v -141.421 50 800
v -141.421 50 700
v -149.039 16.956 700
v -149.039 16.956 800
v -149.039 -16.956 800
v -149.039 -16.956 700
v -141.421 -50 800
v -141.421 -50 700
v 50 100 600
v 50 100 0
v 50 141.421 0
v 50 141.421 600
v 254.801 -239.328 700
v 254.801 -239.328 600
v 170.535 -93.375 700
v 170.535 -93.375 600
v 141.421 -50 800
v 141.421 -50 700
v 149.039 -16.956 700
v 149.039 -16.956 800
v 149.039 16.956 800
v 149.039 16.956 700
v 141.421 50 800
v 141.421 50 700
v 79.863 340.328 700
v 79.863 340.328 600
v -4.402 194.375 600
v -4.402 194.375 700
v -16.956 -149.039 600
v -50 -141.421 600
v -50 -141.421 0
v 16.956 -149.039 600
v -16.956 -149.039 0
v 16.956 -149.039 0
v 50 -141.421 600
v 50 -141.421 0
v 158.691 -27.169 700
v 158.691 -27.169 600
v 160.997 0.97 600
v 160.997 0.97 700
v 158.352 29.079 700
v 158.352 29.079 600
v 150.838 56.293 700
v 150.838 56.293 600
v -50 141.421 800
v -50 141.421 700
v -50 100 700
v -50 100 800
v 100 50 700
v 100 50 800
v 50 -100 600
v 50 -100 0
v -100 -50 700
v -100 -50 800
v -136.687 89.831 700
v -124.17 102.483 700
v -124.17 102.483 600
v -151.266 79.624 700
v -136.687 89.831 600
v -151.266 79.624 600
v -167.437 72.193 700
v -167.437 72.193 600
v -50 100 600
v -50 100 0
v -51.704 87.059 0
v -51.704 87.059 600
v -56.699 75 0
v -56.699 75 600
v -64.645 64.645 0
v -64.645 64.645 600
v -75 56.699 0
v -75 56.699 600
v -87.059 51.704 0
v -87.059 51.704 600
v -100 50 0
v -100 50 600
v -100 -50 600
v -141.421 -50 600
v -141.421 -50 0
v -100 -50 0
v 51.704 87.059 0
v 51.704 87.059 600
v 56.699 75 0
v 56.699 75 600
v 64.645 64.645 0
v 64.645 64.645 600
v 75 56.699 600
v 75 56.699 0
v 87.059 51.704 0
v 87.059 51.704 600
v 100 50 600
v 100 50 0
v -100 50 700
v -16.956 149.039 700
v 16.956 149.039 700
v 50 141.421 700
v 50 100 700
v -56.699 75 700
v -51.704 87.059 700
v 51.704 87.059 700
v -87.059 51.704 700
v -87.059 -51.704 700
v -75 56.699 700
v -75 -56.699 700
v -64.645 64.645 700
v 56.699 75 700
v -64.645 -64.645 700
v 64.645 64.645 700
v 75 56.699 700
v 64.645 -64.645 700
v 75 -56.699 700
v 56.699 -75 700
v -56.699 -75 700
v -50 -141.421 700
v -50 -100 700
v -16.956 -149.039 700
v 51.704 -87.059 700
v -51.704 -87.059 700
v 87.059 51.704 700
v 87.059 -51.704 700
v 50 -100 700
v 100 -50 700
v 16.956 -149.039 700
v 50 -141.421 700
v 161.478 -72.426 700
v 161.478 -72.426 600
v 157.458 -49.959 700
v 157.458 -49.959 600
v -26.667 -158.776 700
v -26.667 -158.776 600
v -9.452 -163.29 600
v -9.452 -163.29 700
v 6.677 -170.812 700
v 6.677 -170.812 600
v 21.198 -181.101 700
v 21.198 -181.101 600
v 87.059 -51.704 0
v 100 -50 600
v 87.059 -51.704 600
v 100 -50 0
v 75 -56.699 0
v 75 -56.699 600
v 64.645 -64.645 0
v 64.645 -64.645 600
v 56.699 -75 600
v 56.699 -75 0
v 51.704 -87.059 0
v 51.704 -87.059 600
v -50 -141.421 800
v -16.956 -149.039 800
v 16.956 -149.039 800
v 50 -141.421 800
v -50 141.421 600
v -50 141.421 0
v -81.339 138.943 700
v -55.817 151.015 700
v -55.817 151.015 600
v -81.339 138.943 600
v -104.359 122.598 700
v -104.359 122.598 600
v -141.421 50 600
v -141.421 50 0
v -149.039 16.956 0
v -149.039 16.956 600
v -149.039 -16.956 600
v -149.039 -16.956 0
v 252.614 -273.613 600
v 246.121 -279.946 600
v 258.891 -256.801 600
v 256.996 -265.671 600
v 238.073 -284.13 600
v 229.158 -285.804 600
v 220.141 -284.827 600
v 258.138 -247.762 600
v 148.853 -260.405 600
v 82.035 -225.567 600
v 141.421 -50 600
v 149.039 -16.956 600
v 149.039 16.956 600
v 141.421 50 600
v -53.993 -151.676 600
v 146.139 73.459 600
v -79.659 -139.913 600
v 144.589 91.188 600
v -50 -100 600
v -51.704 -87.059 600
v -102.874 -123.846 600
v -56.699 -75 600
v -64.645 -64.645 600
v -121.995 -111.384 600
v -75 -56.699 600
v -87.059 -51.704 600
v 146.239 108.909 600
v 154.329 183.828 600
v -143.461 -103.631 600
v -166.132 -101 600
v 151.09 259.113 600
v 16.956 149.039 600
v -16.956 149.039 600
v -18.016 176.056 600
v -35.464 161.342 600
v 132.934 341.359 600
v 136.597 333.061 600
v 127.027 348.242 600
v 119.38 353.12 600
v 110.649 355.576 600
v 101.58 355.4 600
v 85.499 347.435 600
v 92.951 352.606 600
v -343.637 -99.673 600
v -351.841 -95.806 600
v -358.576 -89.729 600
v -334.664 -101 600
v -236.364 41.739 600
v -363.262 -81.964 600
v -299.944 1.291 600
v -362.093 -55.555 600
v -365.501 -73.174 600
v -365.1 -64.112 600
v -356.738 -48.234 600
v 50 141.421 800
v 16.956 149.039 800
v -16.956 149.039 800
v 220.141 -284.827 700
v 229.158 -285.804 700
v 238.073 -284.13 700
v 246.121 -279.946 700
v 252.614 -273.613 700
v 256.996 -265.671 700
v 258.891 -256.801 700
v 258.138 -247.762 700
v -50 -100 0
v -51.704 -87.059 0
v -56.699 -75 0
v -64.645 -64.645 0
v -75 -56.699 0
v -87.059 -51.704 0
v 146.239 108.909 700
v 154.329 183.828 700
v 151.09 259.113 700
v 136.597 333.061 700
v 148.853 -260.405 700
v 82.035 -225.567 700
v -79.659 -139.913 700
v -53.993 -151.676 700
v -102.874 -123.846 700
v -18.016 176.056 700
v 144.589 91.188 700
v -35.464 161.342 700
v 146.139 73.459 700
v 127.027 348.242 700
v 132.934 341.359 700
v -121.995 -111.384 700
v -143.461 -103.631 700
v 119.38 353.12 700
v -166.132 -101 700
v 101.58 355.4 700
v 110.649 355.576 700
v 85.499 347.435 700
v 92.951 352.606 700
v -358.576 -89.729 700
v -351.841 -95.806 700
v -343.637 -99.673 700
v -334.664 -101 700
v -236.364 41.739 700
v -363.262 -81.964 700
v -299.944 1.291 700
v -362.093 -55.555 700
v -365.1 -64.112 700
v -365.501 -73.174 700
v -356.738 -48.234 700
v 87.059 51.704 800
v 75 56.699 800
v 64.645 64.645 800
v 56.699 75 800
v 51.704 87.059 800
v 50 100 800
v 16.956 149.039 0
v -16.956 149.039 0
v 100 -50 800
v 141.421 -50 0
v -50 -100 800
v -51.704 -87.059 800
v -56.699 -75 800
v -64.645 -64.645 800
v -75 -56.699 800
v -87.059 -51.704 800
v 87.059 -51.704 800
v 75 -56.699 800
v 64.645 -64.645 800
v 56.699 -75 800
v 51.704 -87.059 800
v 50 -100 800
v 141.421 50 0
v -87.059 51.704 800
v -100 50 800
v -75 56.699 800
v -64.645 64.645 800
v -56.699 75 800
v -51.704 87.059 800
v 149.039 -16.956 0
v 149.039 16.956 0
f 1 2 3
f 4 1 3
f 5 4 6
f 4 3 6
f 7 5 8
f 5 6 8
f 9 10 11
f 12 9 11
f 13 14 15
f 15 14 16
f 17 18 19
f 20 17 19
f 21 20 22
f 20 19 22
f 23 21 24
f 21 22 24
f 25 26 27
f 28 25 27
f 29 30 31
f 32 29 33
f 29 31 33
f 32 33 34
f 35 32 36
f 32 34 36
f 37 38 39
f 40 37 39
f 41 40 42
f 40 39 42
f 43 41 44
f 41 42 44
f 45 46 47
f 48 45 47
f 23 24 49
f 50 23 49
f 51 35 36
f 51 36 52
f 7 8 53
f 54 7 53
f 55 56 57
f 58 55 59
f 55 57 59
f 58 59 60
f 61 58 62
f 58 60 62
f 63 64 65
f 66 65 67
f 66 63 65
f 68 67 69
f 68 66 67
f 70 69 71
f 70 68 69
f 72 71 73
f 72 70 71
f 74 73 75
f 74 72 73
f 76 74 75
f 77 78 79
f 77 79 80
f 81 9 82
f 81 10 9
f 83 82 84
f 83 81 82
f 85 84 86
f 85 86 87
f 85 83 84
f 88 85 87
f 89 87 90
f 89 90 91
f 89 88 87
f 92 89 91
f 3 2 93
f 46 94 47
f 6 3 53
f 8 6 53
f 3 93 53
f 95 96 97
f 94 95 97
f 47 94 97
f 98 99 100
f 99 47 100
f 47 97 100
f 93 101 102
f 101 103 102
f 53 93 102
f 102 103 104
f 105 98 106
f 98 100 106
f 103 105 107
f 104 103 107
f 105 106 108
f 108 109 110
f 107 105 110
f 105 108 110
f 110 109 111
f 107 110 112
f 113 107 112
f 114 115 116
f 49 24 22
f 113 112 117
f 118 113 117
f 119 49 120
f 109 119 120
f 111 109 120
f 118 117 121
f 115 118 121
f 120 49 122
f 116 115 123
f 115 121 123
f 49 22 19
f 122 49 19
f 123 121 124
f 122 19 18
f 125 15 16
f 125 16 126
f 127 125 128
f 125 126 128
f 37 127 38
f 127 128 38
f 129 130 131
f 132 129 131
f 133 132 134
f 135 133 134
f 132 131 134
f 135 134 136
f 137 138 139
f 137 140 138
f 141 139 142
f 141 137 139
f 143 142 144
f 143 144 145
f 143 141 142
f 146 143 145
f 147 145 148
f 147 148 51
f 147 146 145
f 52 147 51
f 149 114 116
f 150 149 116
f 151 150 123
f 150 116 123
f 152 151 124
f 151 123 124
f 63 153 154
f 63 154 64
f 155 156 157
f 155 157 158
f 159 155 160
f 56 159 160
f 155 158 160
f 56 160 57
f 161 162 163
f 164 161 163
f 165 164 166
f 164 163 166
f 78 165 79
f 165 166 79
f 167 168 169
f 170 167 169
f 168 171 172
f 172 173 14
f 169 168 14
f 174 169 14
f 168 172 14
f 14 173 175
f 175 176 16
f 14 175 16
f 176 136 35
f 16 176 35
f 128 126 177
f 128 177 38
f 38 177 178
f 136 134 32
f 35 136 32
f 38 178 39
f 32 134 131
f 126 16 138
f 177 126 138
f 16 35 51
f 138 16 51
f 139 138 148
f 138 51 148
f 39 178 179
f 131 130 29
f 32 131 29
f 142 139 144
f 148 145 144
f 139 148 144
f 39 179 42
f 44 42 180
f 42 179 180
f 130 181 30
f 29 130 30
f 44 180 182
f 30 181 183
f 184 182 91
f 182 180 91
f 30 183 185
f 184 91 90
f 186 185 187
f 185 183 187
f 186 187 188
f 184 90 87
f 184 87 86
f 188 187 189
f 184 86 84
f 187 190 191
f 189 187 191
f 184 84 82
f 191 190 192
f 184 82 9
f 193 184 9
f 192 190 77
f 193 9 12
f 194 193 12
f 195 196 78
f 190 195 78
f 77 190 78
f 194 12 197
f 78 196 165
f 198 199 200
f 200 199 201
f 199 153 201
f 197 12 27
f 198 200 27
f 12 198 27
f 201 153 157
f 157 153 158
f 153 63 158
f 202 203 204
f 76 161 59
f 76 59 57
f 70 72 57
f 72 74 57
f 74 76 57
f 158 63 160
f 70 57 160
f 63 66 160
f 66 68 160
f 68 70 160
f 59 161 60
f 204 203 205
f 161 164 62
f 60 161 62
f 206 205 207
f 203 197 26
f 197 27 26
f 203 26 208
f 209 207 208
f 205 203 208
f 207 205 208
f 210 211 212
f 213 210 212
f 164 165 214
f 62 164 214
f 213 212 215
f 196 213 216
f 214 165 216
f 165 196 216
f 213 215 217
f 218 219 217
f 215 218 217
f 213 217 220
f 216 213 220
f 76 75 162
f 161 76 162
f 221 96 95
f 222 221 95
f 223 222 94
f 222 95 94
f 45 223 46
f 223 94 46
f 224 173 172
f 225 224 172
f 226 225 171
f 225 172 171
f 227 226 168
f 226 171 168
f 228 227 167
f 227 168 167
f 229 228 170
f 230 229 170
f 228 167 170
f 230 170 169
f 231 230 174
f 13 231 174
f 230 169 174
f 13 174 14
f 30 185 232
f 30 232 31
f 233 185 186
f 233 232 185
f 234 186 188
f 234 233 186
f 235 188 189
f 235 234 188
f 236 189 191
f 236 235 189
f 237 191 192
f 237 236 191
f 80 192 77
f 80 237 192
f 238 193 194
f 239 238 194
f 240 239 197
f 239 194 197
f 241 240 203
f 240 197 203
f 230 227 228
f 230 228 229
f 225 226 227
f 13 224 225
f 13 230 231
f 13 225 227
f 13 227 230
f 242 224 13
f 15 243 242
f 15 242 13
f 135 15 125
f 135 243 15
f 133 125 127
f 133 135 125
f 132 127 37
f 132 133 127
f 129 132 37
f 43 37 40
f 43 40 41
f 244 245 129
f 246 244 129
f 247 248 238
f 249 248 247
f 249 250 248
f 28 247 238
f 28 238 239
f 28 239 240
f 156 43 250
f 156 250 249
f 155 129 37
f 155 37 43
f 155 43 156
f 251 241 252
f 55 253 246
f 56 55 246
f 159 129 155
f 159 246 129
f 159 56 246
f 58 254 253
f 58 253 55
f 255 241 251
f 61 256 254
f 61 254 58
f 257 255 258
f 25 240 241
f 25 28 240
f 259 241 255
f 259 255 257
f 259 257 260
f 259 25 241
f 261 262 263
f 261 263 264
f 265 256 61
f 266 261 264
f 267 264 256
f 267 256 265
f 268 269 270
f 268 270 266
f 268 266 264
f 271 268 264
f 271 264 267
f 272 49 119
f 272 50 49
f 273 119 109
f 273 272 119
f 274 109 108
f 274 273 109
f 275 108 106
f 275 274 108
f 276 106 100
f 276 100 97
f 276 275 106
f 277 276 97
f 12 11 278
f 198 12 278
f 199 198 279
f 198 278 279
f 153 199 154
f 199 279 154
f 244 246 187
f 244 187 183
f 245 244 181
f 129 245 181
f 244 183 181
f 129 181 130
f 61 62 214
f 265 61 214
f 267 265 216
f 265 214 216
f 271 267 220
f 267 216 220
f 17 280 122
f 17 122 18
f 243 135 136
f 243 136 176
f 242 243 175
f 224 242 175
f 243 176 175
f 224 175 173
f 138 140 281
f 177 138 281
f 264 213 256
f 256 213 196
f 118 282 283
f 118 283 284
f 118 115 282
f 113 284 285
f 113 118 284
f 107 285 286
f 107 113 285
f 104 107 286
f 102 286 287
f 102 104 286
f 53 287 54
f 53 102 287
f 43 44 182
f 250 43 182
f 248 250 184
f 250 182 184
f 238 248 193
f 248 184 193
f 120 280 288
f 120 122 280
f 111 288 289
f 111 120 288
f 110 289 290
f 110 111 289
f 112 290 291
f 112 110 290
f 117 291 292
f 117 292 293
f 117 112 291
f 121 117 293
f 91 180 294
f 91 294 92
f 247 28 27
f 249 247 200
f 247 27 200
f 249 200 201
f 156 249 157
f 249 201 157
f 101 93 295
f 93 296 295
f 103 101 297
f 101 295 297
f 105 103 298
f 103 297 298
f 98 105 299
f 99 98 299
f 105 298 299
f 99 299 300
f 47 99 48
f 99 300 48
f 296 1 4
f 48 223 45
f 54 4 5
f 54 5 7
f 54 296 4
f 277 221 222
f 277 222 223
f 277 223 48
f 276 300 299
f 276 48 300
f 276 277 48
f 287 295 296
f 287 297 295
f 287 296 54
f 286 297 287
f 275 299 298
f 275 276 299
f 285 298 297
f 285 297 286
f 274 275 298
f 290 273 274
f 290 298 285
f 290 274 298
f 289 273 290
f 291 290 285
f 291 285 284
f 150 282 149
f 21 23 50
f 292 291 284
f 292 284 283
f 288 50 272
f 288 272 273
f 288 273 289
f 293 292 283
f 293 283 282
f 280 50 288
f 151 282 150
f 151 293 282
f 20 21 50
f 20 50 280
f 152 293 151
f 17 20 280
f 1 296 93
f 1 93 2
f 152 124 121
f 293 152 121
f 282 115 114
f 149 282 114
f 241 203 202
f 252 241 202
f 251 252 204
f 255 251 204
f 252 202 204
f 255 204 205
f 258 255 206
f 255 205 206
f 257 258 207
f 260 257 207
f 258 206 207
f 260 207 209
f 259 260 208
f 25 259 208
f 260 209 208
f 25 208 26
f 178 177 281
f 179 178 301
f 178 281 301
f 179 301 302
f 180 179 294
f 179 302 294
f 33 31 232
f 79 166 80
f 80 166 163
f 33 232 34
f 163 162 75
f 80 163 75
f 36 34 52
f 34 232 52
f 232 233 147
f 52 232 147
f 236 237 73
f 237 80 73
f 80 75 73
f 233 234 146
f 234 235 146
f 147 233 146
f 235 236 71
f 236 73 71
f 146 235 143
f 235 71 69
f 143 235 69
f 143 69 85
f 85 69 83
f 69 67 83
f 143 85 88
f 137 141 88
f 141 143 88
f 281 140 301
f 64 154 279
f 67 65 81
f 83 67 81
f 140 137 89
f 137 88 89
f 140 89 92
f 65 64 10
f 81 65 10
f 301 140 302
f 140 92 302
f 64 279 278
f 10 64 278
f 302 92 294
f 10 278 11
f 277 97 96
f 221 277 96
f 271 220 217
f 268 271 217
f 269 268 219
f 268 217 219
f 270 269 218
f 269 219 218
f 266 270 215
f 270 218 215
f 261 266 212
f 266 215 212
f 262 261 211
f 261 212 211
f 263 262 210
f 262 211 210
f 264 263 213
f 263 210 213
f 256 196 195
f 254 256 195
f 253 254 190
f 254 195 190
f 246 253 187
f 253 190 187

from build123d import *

# Parameters (mm, degrees)
BOSS_EXTRUDE1_DEPTH = 600
CIRPATTERN1_COUNT   = 4
FILLET1_R           = 50
SKETCH4_R           = 160
BOSS_EXTRUDE3_DEPTH = 100
BOSS_EXTRUDE2_DEPTH = 100
FILLET2_R           = 30
CIRPATTERN2_COUNT   = 3
FILLET4_R           = 100
EXTRUDE_THIN1_START = -100
EXTRUDE_THIN1_DEPTH = 100
BOSS_EXTRUDE4_START = 700
BOSS_EXTRUDE4_DEPTH = 100
CIRPATTERN3_COUNT   = 4
FILLET3_R           = 50


with BuildPart() as part:
    # Sketch1 → Boss-Extrude1 (new body)
    with BuildSketch(Plane(origin=(0, 0, 0), x_dir=(0, 1, 0), z_dir=(0, 0, 1))):
        with BuildLine():
            Line((-50, 141.421356237), (-50, 0))
            Line((-50, 0), (50, 0))
            Line((50, 0), (50, 141.421356237))
            ThreePointArc((50, 141.421356237), (0, 150), (-50, 141.421356237))
        make_face()
    extrude(amount=BOSS_EXTRUDE1_DEPTH)


with BuildPart() as cirpattern1_1:
    # CirPattern1: pattern copy
    add(part.part.rotate(Axis((0, 0, 0), (0, 0, 1)), 1 * 360 / CIRPATTERN1_COUNT))


with BuildPart() as cirpattern1_2:
    # CirPattern1: pattern copy
    add(part.part.rotate(Axis((0, 0, 0), (0, 0, 1)), 2 * 360 / CIRPATTERN1_COUNT))


with BuildPart() as cirpattern1_3:
    # CirPattern1: pattern copy
    add(part.part.rotate(Axis((0, 0, 0), (0, 0, 1)), 3 * 360 / CIRPATTERN1_COUNT))


with BuildPart() as part_1:
    add(part.part)

    # Combine1: union CirPattern1_1, CirPattern1_2, CirPattern1_3
    add(cirpattern1_1.part)
    add(cirpattern1_2.part)
    add(cirpattern1_3.part)

    # Fillet1
    fillet1_edges = [part_1.edges().sort_by_distance(p)[0] for p in [
        (-50, 50, 300),
        (-50, -50, 300),
        (50, -50, 300),
        (50, 50, 300),
    ]]
    fillet(fillet1_edges, radius=FILLET1_R)

    # Sketch4 → Boss-Extrude3 (add)
    with BuildSketch(Plane(origin=(0, 0, 600), x_dir=(0, 1, 0), z_dir=(0, 0, 1))):
        Circle(SKETCH4_R)
    extrude(amount=BOSS_EXTRUDE3_DEPTH)


with BuildPart() as body_2:
    # Sketch3 → Boss-Extrude2 (new body)
    with BuildSketch(Plane(origin=(0, 0, 600), x_dir=(0, 1, 0), z_dir=(0, 0, 1))):
        with BuildLine():
            Line((-100, 0), (-100, 400))
            ThreePointArc((-100, 400), (47.2135955, 223.60679775), (100, 0))
            Line((100, 0), (-100, 0))
        make_face()
    extrude(amount=BOSS_EXTRUDE2_DEPTH)

    # Fillet2
    fillet2_edges = [body_2.edges().sort_by_distance(p)[0] for p in [
        (-400, -100, 650),
    ]]
    fillet(fillet2_edges, radius=FILLET2_R)


with BuildPart() as cirpattern2_1:
    # CirPattern2: pattern copy
    add(body_2.part.rotate(Axis((0, 0, 0), (0, 0, 1)), 1 * 360 / CIRPATTERN2_COUNT))


with BuildPart() as cirpattern2_2:
    # CirPattern2: pattern copy
    add(body_2.part.rotate(Axis((0, 0, 0), (0, 0, 1)), 2 * 360 / CIRPATTERN2_COUNT))


with BuildPart() as part_2:
    add(part_1.part)

    # Combine2: union body 2, CirPattern2_2, CirPattern2_1
    add(body_2.part)
    add(cirpattern2_2.part)
    add(cirpattern2_1.part)

    # Fillet4
    fillet4_edges = [part_2.edges().sort_by_distance(p)[0] for p in [
        (-138.274184142, 80.5, 650),
        (-124.899959968, -100, 650),
        (-24.152560394, 158.166538264, 650),
        (-0.577952934, -159.998956154, 650),
        (138.852137075, 79.498956154, 650),
        (149.052520362, -58.166538264, 650),
    ]]
    fillet(fillet4_edges, radius=FILLET4_R)

    # Sketch5 → Extrude-Thin1 (add)
    with BuildSketch(Plane(origin=(0, 0, 700), x_dir=(0, 1, 0), z_dir=(0, 0, 1)).offset(EXTRUDE_THIN1_START)):
        with BuildLine():
            Line((-101, 334.664010614), (-101, 166.132477258))
            ThreePointArc((-101, 166.132477258), (-106.886545631, 132.503849344), (-123.846153846, 102.874341687))
            ThreePointArc((-123.846153846, 102.874341687), (-146.358154113, 67.084206225), (-158.776100224, 26.667395777))
            ThreePointArc((-158.776100224, 26.667395777), (-166.687757285, 1.218391324), (-181.101188564, -21.198101351))
            ThreePointArc((-181.101188564, -21.198101351), (-244.243580866, -114.788399022), (-284.826797866, -220.140703324))
            ThreePointArc((-284.826797866, -220.140703324), (-273.61273561, -252.61379645), (-239.327534924, -254.800571089))
            Line((-239.327534924, -254.800571089), (-93.374945699, -170.534804411))
            ThreePointArc((-93.374945699, -170.534804411), (-61.308426816, -158.818388511), (-27.168716375, -158.691086235))
            ThreePointArc((-27.168716375, -158.691086235), (15.082450273, -160.291982625), (56.293407917, -150.837834197))
            ThreePointArc((56.293407917, -150.837834197), (82.288720804, -144.965027971), (108.908688564, -146.239179276))
            ThreePointArc((108.908688564, -146.239179276), (221.531460046, -154.12694623), (333.060840419, -136.596890968))
            ThreePointArc((333.060840419, -136.596890968), (355.576332877, -110.648681612), (340.327534924, -79.863439525))
            Line((340.327534924, -79.863439525), (194.374945699, 4.402327153))
            ThreePointArc((194.374945699, 4.402327153), (168.194972447, 26.314539167), (151.014870222, 55.816744548))
            ThreePointArc((151.014870222, 55.816744548), (131.275703839, 93.2077764), (102.482692308, 124.17043842))
            ThreePointArc((102.482692308, 124.17043842), (84.399036481, 143.746636647), (72.1925, 167.437280627))
            ThreePointArc((72.1925, 167.437280627), (22.71212082, 268.915345252), (-48.234042553, 356.737594292))
            ThreePointArc((-48.234042553, 356.737594292), (-81.963597267, 363.262478063), (-101, 334.664010614))
        make_face()
        with BuildLine():
            Line((-100, 334.664010614), (-100, 166.132477258))
            ThreePointArc((-100, 166.132477258), (-105.946005687, 132.164166234), (-123.076923077, 102.235370621))
            ThreePointArc((-123.076923077, 102.235370621), (-145.449097255, 66.667534136), (-157.789913267, 26.501759778))
            ThreePointArc((-157.789913267, 26.501759778), (-165.781486055, 0.795694675), (-180.340507548, -21.847227219))
            ThreePointArc((-180.340507548, -21.847227219), (-243.356867131, -115.250717909), (-283.859079706, -220.392738171))
            ThreePointArc((-283.859079706, -220.392738171), (-273.006761394, -251.818312164), (-239.827534924, -253.934545685))
            Line((-239.827534924, -253.934545685), (-93.874945699, -169.668779008))
            ThreePointArc((-93.874945699, -169.668779008), (-61.484522585, -157.834015472), (-26.999966584, -157.705427315))
            ThreePointArc((-26.999966584, -157.705427315), (14.988770458, -159.296380248), (55.94375942, -149.900953239))
            ThreePointArc((55.94375942, -149.900953239), (82.201651226, -143.968825738), (109.090507548, -145.255847259))
            ThreePointArc((109.090507548, -145.255847259), (221.48848308, -153.127870166), (332.795249919, -135.632805035))
            ThreePointArc((332.795249919, -135.632805035), (354.584436169, -110.521634691), (339.827534924, -80.729464928))
            Line((339.827534924, -80.729464928), (193.874945699, 3.536301749))
            ThreePointArc((193.874945699, 3.536301749), (167.430528272, 25.669849238), (150.076889661, 55.470056694))
            ThreePointArc((150.076889661, 55.470056694), (130.460326797, 92.628846112), (101.846153846, 123.399193461))
            ThreePointArc((101.846153846, 123.399193461), (83.57983483, 143.173131064), (71.25, 167.103074478))
            ThreePointArc((71.25, 167.103074478), (21.868384052, 268.378588076), (-48.936170213, 356.025543206))
            ThreePointArc((-48.936170213, 356.025543206), (-81.577674775, 362.339946854), (-100, 334.664010614))
        make_face(mode=Mode.SUBTRACT)
    extrude(amount=EXTRUDE_THIN1_DEPTH)


with BuildPart() as body_2_2:
    # Sketch1<3> → Boss-Extrude4 (new body)
    with BuildSketch(Plane(origin=(0, 0, 0), x_dir=(0, 1, 0), z_dir=(0, 0, 1)).offset(BOSS_EXTRUDE4_START)):
        with BuildLine():
            Line((-50, 141.421356237), (-50, 0))
            Line((-50, 0), (50, 0))
            Line((50, 0), (50, 141.421356237))
            ThreePointArc((50, 141.421356237), (0, 150), (-50, 141.421356237))
        make_face()
    extrude(amount=BOSS_EXTRUDE4_DEPTH)


with BuildPart() as cirpattern3_1:
    # CirPattern3: pattern copy
    add(body_2_2.part.rotate(Axis((0, 0, 0), (0, 0, 1)), 1 * 360 / CIRPATTERN3_COUNT))


with BuildPart() as cirpattern3_2:
    # CirPattern3: pattern copy
    add(body_2_2.part.rotate(Axis((0, 0, 0), (0, 0, 1)), 2 * 360 / CIRPATTERN3_COUNT))


with BuildPart() as cirpattern3_3:
    # CirPattern3: pattern copy
    add(body_2_2.part.rotate(Axis((0, 0, 0), (0, 0, 1)), 3 * 360 / CIRPATTERN3_COUNT))


with BuildPart() as body_2_2_1:
    add(body_2_2.part)

    # Combine3: union CirPattern3_3, CirPattern3_1, CirPattern3_2
    add(cirpattern3_3.part)
    add(cirpattern3_1.part)
    add(cirpattern3_2.part)

    # Fillet3
    fillet3_edges = [body_2_2_1.edges().sort_by_distance(p)[0] for p in [
        (-50, 50, 750),
        (-50, -50, 750),
        (50, 50, 750),
        (50, -50, 750),
    ]]
    fillet(fillet3_edges, radius=FILLET3_R)


solid = Compound([part_2.part, body_2_2_1.part])
